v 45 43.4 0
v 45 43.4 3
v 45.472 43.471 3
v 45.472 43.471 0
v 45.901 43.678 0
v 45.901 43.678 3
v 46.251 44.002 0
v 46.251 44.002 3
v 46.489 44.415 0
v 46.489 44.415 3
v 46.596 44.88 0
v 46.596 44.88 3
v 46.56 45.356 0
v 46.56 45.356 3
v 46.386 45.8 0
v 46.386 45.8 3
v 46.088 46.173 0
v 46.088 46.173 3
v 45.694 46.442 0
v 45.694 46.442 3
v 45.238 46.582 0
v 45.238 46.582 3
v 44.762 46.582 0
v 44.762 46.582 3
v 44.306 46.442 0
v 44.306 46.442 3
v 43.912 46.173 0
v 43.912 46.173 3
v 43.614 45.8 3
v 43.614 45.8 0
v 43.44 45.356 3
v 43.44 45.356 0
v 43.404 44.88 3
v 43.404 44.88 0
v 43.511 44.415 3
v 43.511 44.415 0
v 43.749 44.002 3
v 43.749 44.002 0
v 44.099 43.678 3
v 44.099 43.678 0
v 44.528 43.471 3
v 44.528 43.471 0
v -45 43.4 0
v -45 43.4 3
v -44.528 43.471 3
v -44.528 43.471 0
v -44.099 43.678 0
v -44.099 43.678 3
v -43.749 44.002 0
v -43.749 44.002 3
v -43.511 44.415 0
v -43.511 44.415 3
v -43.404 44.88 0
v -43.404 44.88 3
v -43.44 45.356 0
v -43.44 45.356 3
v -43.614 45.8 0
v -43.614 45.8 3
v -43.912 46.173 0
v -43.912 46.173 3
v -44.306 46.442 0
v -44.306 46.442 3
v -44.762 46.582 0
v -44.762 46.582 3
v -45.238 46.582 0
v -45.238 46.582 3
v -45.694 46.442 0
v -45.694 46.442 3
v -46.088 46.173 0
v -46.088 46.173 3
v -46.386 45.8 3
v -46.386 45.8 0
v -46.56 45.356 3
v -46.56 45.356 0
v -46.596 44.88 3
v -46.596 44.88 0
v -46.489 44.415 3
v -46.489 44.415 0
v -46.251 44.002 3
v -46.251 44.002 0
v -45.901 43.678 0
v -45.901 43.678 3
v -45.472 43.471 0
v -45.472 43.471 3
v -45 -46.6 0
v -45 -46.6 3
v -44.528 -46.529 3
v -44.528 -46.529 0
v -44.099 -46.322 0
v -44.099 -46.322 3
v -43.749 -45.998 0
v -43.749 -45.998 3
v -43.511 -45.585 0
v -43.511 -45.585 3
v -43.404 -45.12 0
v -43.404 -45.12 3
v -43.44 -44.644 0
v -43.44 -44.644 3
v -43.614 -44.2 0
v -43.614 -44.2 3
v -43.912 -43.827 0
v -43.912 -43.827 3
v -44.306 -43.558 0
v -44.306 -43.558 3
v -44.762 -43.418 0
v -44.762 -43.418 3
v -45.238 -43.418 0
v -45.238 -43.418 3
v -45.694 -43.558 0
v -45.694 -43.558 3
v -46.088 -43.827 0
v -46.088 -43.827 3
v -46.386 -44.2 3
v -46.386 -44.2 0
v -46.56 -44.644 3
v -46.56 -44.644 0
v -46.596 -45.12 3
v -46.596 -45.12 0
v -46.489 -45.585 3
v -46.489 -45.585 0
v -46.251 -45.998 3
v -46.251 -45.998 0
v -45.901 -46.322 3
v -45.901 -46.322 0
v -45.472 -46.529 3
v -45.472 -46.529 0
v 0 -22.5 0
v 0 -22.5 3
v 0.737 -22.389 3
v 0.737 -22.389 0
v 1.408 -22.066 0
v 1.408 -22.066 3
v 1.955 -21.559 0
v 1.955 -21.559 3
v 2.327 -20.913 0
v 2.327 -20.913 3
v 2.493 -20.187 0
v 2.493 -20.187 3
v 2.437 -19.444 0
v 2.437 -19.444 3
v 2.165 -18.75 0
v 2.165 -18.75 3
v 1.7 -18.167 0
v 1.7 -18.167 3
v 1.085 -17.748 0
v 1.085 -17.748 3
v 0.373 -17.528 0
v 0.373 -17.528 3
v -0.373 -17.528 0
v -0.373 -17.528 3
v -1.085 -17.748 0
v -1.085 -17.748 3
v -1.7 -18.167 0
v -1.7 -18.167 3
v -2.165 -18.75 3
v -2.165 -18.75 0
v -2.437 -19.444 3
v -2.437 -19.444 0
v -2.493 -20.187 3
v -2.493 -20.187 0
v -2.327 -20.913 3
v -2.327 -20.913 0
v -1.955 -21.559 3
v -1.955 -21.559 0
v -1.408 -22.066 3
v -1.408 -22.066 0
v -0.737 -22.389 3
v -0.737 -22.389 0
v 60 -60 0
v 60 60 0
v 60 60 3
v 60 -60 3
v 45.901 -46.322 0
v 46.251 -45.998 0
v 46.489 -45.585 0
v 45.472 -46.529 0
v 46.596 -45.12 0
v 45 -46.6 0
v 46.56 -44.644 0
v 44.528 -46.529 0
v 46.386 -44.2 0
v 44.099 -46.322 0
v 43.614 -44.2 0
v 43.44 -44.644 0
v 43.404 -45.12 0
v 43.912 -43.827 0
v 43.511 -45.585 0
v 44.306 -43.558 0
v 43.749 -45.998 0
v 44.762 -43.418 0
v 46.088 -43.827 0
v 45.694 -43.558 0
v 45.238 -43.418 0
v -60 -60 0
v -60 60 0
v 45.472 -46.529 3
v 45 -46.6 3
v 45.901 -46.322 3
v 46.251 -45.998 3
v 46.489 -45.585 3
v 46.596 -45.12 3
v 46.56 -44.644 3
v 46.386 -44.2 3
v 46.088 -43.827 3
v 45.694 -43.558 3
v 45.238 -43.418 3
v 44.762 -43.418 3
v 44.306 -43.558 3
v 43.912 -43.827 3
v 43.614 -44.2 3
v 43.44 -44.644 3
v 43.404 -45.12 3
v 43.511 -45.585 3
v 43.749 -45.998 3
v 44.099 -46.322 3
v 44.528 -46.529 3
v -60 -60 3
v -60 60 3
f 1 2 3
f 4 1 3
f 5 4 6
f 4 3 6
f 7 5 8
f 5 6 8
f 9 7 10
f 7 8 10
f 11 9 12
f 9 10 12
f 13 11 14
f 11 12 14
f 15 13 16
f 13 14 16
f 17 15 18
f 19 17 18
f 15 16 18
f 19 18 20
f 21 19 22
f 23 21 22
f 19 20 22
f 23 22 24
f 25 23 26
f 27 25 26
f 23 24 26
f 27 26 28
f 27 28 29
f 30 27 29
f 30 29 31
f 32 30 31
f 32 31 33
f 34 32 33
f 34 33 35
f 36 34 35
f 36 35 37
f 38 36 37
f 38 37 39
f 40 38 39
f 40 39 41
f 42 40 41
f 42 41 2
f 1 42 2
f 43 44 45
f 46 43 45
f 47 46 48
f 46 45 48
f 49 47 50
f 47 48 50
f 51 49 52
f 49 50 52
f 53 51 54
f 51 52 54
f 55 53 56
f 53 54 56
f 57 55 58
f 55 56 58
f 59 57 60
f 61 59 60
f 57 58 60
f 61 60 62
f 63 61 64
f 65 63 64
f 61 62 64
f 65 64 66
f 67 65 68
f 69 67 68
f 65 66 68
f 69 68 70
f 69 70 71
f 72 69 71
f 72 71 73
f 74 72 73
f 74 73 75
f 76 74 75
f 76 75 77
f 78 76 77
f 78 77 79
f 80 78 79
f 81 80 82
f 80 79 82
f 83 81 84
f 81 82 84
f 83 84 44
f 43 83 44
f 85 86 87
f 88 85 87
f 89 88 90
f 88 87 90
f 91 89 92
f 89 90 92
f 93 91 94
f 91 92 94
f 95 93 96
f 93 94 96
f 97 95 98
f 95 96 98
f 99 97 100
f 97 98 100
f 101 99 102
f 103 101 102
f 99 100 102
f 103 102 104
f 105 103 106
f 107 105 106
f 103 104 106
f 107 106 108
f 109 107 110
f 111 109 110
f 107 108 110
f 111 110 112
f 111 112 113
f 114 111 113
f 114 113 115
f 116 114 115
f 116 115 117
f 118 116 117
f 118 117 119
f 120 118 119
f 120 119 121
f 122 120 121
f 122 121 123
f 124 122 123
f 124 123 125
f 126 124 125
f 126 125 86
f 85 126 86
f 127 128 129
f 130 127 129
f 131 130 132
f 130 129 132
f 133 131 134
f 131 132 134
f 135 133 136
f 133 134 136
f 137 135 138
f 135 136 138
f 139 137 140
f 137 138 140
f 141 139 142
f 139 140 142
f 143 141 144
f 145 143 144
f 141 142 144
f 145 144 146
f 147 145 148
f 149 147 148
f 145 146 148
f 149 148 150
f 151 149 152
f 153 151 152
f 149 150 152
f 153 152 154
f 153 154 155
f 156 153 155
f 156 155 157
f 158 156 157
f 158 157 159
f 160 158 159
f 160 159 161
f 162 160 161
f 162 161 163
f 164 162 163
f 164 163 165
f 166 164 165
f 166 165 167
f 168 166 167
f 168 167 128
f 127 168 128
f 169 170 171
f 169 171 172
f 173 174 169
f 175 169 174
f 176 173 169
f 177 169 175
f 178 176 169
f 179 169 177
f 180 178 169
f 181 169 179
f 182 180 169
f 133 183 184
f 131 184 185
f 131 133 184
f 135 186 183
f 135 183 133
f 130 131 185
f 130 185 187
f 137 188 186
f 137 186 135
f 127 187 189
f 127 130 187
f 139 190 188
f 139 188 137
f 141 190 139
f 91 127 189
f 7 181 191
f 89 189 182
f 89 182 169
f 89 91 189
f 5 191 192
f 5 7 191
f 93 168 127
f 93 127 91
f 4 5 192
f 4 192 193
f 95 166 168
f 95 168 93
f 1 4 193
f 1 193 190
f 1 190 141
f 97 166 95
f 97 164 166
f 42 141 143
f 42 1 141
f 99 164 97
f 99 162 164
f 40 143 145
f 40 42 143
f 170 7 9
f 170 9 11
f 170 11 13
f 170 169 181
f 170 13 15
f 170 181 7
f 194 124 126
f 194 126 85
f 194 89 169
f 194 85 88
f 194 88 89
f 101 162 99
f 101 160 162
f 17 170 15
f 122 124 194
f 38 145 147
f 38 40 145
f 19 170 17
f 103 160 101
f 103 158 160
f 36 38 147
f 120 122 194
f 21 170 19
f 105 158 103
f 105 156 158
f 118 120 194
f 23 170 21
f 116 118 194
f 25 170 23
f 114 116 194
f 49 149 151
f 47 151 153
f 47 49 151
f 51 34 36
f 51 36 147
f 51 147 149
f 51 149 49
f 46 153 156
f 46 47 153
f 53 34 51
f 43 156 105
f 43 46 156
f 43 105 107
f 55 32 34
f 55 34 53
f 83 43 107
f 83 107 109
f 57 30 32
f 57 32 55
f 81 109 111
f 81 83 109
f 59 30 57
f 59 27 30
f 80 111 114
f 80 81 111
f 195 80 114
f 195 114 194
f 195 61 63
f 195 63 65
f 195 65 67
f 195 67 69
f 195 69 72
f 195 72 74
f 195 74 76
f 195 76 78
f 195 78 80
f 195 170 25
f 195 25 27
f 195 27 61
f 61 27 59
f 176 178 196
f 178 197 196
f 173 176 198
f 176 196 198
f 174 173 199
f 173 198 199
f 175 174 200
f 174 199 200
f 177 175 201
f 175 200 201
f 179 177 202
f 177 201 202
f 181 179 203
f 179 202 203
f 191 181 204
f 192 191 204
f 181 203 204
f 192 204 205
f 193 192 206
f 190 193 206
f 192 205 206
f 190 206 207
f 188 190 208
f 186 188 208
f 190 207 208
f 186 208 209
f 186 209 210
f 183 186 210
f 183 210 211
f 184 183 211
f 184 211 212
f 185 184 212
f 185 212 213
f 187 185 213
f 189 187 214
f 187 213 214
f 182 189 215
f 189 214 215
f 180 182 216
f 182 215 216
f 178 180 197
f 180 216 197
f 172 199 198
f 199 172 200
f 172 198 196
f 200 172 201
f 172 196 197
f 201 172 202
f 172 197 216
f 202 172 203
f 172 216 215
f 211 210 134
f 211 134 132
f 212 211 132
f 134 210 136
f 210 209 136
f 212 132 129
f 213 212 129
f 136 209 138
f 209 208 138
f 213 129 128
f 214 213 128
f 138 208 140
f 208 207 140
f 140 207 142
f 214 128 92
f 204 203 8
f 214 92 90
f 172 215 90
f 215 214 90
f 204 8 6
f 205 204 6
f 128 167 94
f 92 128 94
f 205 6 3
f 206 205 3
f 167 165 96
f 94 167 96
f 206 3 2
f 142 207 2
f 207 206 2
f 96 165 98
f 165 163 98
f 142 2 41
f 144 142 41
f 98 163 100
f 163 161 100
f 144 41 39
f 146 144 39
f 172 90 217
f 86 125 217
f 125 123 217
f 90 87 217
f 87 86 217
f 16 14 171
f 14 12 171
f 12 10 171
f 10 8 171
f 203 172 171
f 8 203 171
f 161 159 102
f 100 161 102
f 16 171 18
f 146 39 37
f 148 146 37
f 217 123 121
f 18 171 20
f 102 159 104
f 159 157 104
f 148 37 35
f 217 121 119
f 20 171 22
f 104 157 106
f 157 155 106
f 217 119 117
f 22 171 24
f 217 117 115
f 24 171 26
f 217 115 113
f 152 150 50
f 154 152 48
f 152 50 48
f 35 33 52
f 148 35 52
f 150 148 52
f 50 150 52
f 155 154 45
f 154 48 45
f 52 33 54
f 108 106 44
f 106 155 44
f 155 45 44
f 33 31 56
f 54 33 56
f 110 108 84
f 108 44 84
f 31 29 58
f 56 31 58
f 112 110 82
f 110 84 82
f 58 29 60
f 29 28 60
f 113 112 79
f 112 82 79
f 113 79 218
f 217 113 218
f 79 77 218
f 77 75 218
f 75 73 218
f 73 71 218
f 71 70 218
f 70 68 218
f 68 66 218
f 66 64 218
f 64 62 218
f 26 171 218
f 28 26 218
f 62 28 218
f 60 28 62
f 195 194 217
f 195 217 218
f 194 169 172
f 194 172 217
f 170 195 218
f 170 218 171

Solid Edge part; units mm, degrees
sketch "Sketch1" plane through (0, 0, 0) normal (0, 0, 1) x (1, 0, 0)
  line L0 (60, -60) -> (-60, -60)
  line L1 (-60, -60) -> (-60, 60)
  line L2 (-60, 60) -> (60, 60)
  line L3 (60, 60) -> (60, -60)
  dimension "D1" = 120
  dimension "D2" = 120
extrude "Protrusion1" add sketch "Sketch1" along normal blind 3
hole "Hole_1" at (0, -20, 3) direction (0, 0, -1) diameter 5 end through all
hole "Hole_2" at (-45, -45, 3) direction (0, 0, -1) diameter 3.2 end through all
hole "Hole1" at (45, -45, 3) direction (0, 0, -1) diameter 3.2 end through all
hole "Hole2" at (45, 45, 3) direction (0, 0, -1) diameter 3.2 end through all
hole "Hole3" at (-45, 45, 3) direction (0, 0, -1) diameter 3.2 end through all
